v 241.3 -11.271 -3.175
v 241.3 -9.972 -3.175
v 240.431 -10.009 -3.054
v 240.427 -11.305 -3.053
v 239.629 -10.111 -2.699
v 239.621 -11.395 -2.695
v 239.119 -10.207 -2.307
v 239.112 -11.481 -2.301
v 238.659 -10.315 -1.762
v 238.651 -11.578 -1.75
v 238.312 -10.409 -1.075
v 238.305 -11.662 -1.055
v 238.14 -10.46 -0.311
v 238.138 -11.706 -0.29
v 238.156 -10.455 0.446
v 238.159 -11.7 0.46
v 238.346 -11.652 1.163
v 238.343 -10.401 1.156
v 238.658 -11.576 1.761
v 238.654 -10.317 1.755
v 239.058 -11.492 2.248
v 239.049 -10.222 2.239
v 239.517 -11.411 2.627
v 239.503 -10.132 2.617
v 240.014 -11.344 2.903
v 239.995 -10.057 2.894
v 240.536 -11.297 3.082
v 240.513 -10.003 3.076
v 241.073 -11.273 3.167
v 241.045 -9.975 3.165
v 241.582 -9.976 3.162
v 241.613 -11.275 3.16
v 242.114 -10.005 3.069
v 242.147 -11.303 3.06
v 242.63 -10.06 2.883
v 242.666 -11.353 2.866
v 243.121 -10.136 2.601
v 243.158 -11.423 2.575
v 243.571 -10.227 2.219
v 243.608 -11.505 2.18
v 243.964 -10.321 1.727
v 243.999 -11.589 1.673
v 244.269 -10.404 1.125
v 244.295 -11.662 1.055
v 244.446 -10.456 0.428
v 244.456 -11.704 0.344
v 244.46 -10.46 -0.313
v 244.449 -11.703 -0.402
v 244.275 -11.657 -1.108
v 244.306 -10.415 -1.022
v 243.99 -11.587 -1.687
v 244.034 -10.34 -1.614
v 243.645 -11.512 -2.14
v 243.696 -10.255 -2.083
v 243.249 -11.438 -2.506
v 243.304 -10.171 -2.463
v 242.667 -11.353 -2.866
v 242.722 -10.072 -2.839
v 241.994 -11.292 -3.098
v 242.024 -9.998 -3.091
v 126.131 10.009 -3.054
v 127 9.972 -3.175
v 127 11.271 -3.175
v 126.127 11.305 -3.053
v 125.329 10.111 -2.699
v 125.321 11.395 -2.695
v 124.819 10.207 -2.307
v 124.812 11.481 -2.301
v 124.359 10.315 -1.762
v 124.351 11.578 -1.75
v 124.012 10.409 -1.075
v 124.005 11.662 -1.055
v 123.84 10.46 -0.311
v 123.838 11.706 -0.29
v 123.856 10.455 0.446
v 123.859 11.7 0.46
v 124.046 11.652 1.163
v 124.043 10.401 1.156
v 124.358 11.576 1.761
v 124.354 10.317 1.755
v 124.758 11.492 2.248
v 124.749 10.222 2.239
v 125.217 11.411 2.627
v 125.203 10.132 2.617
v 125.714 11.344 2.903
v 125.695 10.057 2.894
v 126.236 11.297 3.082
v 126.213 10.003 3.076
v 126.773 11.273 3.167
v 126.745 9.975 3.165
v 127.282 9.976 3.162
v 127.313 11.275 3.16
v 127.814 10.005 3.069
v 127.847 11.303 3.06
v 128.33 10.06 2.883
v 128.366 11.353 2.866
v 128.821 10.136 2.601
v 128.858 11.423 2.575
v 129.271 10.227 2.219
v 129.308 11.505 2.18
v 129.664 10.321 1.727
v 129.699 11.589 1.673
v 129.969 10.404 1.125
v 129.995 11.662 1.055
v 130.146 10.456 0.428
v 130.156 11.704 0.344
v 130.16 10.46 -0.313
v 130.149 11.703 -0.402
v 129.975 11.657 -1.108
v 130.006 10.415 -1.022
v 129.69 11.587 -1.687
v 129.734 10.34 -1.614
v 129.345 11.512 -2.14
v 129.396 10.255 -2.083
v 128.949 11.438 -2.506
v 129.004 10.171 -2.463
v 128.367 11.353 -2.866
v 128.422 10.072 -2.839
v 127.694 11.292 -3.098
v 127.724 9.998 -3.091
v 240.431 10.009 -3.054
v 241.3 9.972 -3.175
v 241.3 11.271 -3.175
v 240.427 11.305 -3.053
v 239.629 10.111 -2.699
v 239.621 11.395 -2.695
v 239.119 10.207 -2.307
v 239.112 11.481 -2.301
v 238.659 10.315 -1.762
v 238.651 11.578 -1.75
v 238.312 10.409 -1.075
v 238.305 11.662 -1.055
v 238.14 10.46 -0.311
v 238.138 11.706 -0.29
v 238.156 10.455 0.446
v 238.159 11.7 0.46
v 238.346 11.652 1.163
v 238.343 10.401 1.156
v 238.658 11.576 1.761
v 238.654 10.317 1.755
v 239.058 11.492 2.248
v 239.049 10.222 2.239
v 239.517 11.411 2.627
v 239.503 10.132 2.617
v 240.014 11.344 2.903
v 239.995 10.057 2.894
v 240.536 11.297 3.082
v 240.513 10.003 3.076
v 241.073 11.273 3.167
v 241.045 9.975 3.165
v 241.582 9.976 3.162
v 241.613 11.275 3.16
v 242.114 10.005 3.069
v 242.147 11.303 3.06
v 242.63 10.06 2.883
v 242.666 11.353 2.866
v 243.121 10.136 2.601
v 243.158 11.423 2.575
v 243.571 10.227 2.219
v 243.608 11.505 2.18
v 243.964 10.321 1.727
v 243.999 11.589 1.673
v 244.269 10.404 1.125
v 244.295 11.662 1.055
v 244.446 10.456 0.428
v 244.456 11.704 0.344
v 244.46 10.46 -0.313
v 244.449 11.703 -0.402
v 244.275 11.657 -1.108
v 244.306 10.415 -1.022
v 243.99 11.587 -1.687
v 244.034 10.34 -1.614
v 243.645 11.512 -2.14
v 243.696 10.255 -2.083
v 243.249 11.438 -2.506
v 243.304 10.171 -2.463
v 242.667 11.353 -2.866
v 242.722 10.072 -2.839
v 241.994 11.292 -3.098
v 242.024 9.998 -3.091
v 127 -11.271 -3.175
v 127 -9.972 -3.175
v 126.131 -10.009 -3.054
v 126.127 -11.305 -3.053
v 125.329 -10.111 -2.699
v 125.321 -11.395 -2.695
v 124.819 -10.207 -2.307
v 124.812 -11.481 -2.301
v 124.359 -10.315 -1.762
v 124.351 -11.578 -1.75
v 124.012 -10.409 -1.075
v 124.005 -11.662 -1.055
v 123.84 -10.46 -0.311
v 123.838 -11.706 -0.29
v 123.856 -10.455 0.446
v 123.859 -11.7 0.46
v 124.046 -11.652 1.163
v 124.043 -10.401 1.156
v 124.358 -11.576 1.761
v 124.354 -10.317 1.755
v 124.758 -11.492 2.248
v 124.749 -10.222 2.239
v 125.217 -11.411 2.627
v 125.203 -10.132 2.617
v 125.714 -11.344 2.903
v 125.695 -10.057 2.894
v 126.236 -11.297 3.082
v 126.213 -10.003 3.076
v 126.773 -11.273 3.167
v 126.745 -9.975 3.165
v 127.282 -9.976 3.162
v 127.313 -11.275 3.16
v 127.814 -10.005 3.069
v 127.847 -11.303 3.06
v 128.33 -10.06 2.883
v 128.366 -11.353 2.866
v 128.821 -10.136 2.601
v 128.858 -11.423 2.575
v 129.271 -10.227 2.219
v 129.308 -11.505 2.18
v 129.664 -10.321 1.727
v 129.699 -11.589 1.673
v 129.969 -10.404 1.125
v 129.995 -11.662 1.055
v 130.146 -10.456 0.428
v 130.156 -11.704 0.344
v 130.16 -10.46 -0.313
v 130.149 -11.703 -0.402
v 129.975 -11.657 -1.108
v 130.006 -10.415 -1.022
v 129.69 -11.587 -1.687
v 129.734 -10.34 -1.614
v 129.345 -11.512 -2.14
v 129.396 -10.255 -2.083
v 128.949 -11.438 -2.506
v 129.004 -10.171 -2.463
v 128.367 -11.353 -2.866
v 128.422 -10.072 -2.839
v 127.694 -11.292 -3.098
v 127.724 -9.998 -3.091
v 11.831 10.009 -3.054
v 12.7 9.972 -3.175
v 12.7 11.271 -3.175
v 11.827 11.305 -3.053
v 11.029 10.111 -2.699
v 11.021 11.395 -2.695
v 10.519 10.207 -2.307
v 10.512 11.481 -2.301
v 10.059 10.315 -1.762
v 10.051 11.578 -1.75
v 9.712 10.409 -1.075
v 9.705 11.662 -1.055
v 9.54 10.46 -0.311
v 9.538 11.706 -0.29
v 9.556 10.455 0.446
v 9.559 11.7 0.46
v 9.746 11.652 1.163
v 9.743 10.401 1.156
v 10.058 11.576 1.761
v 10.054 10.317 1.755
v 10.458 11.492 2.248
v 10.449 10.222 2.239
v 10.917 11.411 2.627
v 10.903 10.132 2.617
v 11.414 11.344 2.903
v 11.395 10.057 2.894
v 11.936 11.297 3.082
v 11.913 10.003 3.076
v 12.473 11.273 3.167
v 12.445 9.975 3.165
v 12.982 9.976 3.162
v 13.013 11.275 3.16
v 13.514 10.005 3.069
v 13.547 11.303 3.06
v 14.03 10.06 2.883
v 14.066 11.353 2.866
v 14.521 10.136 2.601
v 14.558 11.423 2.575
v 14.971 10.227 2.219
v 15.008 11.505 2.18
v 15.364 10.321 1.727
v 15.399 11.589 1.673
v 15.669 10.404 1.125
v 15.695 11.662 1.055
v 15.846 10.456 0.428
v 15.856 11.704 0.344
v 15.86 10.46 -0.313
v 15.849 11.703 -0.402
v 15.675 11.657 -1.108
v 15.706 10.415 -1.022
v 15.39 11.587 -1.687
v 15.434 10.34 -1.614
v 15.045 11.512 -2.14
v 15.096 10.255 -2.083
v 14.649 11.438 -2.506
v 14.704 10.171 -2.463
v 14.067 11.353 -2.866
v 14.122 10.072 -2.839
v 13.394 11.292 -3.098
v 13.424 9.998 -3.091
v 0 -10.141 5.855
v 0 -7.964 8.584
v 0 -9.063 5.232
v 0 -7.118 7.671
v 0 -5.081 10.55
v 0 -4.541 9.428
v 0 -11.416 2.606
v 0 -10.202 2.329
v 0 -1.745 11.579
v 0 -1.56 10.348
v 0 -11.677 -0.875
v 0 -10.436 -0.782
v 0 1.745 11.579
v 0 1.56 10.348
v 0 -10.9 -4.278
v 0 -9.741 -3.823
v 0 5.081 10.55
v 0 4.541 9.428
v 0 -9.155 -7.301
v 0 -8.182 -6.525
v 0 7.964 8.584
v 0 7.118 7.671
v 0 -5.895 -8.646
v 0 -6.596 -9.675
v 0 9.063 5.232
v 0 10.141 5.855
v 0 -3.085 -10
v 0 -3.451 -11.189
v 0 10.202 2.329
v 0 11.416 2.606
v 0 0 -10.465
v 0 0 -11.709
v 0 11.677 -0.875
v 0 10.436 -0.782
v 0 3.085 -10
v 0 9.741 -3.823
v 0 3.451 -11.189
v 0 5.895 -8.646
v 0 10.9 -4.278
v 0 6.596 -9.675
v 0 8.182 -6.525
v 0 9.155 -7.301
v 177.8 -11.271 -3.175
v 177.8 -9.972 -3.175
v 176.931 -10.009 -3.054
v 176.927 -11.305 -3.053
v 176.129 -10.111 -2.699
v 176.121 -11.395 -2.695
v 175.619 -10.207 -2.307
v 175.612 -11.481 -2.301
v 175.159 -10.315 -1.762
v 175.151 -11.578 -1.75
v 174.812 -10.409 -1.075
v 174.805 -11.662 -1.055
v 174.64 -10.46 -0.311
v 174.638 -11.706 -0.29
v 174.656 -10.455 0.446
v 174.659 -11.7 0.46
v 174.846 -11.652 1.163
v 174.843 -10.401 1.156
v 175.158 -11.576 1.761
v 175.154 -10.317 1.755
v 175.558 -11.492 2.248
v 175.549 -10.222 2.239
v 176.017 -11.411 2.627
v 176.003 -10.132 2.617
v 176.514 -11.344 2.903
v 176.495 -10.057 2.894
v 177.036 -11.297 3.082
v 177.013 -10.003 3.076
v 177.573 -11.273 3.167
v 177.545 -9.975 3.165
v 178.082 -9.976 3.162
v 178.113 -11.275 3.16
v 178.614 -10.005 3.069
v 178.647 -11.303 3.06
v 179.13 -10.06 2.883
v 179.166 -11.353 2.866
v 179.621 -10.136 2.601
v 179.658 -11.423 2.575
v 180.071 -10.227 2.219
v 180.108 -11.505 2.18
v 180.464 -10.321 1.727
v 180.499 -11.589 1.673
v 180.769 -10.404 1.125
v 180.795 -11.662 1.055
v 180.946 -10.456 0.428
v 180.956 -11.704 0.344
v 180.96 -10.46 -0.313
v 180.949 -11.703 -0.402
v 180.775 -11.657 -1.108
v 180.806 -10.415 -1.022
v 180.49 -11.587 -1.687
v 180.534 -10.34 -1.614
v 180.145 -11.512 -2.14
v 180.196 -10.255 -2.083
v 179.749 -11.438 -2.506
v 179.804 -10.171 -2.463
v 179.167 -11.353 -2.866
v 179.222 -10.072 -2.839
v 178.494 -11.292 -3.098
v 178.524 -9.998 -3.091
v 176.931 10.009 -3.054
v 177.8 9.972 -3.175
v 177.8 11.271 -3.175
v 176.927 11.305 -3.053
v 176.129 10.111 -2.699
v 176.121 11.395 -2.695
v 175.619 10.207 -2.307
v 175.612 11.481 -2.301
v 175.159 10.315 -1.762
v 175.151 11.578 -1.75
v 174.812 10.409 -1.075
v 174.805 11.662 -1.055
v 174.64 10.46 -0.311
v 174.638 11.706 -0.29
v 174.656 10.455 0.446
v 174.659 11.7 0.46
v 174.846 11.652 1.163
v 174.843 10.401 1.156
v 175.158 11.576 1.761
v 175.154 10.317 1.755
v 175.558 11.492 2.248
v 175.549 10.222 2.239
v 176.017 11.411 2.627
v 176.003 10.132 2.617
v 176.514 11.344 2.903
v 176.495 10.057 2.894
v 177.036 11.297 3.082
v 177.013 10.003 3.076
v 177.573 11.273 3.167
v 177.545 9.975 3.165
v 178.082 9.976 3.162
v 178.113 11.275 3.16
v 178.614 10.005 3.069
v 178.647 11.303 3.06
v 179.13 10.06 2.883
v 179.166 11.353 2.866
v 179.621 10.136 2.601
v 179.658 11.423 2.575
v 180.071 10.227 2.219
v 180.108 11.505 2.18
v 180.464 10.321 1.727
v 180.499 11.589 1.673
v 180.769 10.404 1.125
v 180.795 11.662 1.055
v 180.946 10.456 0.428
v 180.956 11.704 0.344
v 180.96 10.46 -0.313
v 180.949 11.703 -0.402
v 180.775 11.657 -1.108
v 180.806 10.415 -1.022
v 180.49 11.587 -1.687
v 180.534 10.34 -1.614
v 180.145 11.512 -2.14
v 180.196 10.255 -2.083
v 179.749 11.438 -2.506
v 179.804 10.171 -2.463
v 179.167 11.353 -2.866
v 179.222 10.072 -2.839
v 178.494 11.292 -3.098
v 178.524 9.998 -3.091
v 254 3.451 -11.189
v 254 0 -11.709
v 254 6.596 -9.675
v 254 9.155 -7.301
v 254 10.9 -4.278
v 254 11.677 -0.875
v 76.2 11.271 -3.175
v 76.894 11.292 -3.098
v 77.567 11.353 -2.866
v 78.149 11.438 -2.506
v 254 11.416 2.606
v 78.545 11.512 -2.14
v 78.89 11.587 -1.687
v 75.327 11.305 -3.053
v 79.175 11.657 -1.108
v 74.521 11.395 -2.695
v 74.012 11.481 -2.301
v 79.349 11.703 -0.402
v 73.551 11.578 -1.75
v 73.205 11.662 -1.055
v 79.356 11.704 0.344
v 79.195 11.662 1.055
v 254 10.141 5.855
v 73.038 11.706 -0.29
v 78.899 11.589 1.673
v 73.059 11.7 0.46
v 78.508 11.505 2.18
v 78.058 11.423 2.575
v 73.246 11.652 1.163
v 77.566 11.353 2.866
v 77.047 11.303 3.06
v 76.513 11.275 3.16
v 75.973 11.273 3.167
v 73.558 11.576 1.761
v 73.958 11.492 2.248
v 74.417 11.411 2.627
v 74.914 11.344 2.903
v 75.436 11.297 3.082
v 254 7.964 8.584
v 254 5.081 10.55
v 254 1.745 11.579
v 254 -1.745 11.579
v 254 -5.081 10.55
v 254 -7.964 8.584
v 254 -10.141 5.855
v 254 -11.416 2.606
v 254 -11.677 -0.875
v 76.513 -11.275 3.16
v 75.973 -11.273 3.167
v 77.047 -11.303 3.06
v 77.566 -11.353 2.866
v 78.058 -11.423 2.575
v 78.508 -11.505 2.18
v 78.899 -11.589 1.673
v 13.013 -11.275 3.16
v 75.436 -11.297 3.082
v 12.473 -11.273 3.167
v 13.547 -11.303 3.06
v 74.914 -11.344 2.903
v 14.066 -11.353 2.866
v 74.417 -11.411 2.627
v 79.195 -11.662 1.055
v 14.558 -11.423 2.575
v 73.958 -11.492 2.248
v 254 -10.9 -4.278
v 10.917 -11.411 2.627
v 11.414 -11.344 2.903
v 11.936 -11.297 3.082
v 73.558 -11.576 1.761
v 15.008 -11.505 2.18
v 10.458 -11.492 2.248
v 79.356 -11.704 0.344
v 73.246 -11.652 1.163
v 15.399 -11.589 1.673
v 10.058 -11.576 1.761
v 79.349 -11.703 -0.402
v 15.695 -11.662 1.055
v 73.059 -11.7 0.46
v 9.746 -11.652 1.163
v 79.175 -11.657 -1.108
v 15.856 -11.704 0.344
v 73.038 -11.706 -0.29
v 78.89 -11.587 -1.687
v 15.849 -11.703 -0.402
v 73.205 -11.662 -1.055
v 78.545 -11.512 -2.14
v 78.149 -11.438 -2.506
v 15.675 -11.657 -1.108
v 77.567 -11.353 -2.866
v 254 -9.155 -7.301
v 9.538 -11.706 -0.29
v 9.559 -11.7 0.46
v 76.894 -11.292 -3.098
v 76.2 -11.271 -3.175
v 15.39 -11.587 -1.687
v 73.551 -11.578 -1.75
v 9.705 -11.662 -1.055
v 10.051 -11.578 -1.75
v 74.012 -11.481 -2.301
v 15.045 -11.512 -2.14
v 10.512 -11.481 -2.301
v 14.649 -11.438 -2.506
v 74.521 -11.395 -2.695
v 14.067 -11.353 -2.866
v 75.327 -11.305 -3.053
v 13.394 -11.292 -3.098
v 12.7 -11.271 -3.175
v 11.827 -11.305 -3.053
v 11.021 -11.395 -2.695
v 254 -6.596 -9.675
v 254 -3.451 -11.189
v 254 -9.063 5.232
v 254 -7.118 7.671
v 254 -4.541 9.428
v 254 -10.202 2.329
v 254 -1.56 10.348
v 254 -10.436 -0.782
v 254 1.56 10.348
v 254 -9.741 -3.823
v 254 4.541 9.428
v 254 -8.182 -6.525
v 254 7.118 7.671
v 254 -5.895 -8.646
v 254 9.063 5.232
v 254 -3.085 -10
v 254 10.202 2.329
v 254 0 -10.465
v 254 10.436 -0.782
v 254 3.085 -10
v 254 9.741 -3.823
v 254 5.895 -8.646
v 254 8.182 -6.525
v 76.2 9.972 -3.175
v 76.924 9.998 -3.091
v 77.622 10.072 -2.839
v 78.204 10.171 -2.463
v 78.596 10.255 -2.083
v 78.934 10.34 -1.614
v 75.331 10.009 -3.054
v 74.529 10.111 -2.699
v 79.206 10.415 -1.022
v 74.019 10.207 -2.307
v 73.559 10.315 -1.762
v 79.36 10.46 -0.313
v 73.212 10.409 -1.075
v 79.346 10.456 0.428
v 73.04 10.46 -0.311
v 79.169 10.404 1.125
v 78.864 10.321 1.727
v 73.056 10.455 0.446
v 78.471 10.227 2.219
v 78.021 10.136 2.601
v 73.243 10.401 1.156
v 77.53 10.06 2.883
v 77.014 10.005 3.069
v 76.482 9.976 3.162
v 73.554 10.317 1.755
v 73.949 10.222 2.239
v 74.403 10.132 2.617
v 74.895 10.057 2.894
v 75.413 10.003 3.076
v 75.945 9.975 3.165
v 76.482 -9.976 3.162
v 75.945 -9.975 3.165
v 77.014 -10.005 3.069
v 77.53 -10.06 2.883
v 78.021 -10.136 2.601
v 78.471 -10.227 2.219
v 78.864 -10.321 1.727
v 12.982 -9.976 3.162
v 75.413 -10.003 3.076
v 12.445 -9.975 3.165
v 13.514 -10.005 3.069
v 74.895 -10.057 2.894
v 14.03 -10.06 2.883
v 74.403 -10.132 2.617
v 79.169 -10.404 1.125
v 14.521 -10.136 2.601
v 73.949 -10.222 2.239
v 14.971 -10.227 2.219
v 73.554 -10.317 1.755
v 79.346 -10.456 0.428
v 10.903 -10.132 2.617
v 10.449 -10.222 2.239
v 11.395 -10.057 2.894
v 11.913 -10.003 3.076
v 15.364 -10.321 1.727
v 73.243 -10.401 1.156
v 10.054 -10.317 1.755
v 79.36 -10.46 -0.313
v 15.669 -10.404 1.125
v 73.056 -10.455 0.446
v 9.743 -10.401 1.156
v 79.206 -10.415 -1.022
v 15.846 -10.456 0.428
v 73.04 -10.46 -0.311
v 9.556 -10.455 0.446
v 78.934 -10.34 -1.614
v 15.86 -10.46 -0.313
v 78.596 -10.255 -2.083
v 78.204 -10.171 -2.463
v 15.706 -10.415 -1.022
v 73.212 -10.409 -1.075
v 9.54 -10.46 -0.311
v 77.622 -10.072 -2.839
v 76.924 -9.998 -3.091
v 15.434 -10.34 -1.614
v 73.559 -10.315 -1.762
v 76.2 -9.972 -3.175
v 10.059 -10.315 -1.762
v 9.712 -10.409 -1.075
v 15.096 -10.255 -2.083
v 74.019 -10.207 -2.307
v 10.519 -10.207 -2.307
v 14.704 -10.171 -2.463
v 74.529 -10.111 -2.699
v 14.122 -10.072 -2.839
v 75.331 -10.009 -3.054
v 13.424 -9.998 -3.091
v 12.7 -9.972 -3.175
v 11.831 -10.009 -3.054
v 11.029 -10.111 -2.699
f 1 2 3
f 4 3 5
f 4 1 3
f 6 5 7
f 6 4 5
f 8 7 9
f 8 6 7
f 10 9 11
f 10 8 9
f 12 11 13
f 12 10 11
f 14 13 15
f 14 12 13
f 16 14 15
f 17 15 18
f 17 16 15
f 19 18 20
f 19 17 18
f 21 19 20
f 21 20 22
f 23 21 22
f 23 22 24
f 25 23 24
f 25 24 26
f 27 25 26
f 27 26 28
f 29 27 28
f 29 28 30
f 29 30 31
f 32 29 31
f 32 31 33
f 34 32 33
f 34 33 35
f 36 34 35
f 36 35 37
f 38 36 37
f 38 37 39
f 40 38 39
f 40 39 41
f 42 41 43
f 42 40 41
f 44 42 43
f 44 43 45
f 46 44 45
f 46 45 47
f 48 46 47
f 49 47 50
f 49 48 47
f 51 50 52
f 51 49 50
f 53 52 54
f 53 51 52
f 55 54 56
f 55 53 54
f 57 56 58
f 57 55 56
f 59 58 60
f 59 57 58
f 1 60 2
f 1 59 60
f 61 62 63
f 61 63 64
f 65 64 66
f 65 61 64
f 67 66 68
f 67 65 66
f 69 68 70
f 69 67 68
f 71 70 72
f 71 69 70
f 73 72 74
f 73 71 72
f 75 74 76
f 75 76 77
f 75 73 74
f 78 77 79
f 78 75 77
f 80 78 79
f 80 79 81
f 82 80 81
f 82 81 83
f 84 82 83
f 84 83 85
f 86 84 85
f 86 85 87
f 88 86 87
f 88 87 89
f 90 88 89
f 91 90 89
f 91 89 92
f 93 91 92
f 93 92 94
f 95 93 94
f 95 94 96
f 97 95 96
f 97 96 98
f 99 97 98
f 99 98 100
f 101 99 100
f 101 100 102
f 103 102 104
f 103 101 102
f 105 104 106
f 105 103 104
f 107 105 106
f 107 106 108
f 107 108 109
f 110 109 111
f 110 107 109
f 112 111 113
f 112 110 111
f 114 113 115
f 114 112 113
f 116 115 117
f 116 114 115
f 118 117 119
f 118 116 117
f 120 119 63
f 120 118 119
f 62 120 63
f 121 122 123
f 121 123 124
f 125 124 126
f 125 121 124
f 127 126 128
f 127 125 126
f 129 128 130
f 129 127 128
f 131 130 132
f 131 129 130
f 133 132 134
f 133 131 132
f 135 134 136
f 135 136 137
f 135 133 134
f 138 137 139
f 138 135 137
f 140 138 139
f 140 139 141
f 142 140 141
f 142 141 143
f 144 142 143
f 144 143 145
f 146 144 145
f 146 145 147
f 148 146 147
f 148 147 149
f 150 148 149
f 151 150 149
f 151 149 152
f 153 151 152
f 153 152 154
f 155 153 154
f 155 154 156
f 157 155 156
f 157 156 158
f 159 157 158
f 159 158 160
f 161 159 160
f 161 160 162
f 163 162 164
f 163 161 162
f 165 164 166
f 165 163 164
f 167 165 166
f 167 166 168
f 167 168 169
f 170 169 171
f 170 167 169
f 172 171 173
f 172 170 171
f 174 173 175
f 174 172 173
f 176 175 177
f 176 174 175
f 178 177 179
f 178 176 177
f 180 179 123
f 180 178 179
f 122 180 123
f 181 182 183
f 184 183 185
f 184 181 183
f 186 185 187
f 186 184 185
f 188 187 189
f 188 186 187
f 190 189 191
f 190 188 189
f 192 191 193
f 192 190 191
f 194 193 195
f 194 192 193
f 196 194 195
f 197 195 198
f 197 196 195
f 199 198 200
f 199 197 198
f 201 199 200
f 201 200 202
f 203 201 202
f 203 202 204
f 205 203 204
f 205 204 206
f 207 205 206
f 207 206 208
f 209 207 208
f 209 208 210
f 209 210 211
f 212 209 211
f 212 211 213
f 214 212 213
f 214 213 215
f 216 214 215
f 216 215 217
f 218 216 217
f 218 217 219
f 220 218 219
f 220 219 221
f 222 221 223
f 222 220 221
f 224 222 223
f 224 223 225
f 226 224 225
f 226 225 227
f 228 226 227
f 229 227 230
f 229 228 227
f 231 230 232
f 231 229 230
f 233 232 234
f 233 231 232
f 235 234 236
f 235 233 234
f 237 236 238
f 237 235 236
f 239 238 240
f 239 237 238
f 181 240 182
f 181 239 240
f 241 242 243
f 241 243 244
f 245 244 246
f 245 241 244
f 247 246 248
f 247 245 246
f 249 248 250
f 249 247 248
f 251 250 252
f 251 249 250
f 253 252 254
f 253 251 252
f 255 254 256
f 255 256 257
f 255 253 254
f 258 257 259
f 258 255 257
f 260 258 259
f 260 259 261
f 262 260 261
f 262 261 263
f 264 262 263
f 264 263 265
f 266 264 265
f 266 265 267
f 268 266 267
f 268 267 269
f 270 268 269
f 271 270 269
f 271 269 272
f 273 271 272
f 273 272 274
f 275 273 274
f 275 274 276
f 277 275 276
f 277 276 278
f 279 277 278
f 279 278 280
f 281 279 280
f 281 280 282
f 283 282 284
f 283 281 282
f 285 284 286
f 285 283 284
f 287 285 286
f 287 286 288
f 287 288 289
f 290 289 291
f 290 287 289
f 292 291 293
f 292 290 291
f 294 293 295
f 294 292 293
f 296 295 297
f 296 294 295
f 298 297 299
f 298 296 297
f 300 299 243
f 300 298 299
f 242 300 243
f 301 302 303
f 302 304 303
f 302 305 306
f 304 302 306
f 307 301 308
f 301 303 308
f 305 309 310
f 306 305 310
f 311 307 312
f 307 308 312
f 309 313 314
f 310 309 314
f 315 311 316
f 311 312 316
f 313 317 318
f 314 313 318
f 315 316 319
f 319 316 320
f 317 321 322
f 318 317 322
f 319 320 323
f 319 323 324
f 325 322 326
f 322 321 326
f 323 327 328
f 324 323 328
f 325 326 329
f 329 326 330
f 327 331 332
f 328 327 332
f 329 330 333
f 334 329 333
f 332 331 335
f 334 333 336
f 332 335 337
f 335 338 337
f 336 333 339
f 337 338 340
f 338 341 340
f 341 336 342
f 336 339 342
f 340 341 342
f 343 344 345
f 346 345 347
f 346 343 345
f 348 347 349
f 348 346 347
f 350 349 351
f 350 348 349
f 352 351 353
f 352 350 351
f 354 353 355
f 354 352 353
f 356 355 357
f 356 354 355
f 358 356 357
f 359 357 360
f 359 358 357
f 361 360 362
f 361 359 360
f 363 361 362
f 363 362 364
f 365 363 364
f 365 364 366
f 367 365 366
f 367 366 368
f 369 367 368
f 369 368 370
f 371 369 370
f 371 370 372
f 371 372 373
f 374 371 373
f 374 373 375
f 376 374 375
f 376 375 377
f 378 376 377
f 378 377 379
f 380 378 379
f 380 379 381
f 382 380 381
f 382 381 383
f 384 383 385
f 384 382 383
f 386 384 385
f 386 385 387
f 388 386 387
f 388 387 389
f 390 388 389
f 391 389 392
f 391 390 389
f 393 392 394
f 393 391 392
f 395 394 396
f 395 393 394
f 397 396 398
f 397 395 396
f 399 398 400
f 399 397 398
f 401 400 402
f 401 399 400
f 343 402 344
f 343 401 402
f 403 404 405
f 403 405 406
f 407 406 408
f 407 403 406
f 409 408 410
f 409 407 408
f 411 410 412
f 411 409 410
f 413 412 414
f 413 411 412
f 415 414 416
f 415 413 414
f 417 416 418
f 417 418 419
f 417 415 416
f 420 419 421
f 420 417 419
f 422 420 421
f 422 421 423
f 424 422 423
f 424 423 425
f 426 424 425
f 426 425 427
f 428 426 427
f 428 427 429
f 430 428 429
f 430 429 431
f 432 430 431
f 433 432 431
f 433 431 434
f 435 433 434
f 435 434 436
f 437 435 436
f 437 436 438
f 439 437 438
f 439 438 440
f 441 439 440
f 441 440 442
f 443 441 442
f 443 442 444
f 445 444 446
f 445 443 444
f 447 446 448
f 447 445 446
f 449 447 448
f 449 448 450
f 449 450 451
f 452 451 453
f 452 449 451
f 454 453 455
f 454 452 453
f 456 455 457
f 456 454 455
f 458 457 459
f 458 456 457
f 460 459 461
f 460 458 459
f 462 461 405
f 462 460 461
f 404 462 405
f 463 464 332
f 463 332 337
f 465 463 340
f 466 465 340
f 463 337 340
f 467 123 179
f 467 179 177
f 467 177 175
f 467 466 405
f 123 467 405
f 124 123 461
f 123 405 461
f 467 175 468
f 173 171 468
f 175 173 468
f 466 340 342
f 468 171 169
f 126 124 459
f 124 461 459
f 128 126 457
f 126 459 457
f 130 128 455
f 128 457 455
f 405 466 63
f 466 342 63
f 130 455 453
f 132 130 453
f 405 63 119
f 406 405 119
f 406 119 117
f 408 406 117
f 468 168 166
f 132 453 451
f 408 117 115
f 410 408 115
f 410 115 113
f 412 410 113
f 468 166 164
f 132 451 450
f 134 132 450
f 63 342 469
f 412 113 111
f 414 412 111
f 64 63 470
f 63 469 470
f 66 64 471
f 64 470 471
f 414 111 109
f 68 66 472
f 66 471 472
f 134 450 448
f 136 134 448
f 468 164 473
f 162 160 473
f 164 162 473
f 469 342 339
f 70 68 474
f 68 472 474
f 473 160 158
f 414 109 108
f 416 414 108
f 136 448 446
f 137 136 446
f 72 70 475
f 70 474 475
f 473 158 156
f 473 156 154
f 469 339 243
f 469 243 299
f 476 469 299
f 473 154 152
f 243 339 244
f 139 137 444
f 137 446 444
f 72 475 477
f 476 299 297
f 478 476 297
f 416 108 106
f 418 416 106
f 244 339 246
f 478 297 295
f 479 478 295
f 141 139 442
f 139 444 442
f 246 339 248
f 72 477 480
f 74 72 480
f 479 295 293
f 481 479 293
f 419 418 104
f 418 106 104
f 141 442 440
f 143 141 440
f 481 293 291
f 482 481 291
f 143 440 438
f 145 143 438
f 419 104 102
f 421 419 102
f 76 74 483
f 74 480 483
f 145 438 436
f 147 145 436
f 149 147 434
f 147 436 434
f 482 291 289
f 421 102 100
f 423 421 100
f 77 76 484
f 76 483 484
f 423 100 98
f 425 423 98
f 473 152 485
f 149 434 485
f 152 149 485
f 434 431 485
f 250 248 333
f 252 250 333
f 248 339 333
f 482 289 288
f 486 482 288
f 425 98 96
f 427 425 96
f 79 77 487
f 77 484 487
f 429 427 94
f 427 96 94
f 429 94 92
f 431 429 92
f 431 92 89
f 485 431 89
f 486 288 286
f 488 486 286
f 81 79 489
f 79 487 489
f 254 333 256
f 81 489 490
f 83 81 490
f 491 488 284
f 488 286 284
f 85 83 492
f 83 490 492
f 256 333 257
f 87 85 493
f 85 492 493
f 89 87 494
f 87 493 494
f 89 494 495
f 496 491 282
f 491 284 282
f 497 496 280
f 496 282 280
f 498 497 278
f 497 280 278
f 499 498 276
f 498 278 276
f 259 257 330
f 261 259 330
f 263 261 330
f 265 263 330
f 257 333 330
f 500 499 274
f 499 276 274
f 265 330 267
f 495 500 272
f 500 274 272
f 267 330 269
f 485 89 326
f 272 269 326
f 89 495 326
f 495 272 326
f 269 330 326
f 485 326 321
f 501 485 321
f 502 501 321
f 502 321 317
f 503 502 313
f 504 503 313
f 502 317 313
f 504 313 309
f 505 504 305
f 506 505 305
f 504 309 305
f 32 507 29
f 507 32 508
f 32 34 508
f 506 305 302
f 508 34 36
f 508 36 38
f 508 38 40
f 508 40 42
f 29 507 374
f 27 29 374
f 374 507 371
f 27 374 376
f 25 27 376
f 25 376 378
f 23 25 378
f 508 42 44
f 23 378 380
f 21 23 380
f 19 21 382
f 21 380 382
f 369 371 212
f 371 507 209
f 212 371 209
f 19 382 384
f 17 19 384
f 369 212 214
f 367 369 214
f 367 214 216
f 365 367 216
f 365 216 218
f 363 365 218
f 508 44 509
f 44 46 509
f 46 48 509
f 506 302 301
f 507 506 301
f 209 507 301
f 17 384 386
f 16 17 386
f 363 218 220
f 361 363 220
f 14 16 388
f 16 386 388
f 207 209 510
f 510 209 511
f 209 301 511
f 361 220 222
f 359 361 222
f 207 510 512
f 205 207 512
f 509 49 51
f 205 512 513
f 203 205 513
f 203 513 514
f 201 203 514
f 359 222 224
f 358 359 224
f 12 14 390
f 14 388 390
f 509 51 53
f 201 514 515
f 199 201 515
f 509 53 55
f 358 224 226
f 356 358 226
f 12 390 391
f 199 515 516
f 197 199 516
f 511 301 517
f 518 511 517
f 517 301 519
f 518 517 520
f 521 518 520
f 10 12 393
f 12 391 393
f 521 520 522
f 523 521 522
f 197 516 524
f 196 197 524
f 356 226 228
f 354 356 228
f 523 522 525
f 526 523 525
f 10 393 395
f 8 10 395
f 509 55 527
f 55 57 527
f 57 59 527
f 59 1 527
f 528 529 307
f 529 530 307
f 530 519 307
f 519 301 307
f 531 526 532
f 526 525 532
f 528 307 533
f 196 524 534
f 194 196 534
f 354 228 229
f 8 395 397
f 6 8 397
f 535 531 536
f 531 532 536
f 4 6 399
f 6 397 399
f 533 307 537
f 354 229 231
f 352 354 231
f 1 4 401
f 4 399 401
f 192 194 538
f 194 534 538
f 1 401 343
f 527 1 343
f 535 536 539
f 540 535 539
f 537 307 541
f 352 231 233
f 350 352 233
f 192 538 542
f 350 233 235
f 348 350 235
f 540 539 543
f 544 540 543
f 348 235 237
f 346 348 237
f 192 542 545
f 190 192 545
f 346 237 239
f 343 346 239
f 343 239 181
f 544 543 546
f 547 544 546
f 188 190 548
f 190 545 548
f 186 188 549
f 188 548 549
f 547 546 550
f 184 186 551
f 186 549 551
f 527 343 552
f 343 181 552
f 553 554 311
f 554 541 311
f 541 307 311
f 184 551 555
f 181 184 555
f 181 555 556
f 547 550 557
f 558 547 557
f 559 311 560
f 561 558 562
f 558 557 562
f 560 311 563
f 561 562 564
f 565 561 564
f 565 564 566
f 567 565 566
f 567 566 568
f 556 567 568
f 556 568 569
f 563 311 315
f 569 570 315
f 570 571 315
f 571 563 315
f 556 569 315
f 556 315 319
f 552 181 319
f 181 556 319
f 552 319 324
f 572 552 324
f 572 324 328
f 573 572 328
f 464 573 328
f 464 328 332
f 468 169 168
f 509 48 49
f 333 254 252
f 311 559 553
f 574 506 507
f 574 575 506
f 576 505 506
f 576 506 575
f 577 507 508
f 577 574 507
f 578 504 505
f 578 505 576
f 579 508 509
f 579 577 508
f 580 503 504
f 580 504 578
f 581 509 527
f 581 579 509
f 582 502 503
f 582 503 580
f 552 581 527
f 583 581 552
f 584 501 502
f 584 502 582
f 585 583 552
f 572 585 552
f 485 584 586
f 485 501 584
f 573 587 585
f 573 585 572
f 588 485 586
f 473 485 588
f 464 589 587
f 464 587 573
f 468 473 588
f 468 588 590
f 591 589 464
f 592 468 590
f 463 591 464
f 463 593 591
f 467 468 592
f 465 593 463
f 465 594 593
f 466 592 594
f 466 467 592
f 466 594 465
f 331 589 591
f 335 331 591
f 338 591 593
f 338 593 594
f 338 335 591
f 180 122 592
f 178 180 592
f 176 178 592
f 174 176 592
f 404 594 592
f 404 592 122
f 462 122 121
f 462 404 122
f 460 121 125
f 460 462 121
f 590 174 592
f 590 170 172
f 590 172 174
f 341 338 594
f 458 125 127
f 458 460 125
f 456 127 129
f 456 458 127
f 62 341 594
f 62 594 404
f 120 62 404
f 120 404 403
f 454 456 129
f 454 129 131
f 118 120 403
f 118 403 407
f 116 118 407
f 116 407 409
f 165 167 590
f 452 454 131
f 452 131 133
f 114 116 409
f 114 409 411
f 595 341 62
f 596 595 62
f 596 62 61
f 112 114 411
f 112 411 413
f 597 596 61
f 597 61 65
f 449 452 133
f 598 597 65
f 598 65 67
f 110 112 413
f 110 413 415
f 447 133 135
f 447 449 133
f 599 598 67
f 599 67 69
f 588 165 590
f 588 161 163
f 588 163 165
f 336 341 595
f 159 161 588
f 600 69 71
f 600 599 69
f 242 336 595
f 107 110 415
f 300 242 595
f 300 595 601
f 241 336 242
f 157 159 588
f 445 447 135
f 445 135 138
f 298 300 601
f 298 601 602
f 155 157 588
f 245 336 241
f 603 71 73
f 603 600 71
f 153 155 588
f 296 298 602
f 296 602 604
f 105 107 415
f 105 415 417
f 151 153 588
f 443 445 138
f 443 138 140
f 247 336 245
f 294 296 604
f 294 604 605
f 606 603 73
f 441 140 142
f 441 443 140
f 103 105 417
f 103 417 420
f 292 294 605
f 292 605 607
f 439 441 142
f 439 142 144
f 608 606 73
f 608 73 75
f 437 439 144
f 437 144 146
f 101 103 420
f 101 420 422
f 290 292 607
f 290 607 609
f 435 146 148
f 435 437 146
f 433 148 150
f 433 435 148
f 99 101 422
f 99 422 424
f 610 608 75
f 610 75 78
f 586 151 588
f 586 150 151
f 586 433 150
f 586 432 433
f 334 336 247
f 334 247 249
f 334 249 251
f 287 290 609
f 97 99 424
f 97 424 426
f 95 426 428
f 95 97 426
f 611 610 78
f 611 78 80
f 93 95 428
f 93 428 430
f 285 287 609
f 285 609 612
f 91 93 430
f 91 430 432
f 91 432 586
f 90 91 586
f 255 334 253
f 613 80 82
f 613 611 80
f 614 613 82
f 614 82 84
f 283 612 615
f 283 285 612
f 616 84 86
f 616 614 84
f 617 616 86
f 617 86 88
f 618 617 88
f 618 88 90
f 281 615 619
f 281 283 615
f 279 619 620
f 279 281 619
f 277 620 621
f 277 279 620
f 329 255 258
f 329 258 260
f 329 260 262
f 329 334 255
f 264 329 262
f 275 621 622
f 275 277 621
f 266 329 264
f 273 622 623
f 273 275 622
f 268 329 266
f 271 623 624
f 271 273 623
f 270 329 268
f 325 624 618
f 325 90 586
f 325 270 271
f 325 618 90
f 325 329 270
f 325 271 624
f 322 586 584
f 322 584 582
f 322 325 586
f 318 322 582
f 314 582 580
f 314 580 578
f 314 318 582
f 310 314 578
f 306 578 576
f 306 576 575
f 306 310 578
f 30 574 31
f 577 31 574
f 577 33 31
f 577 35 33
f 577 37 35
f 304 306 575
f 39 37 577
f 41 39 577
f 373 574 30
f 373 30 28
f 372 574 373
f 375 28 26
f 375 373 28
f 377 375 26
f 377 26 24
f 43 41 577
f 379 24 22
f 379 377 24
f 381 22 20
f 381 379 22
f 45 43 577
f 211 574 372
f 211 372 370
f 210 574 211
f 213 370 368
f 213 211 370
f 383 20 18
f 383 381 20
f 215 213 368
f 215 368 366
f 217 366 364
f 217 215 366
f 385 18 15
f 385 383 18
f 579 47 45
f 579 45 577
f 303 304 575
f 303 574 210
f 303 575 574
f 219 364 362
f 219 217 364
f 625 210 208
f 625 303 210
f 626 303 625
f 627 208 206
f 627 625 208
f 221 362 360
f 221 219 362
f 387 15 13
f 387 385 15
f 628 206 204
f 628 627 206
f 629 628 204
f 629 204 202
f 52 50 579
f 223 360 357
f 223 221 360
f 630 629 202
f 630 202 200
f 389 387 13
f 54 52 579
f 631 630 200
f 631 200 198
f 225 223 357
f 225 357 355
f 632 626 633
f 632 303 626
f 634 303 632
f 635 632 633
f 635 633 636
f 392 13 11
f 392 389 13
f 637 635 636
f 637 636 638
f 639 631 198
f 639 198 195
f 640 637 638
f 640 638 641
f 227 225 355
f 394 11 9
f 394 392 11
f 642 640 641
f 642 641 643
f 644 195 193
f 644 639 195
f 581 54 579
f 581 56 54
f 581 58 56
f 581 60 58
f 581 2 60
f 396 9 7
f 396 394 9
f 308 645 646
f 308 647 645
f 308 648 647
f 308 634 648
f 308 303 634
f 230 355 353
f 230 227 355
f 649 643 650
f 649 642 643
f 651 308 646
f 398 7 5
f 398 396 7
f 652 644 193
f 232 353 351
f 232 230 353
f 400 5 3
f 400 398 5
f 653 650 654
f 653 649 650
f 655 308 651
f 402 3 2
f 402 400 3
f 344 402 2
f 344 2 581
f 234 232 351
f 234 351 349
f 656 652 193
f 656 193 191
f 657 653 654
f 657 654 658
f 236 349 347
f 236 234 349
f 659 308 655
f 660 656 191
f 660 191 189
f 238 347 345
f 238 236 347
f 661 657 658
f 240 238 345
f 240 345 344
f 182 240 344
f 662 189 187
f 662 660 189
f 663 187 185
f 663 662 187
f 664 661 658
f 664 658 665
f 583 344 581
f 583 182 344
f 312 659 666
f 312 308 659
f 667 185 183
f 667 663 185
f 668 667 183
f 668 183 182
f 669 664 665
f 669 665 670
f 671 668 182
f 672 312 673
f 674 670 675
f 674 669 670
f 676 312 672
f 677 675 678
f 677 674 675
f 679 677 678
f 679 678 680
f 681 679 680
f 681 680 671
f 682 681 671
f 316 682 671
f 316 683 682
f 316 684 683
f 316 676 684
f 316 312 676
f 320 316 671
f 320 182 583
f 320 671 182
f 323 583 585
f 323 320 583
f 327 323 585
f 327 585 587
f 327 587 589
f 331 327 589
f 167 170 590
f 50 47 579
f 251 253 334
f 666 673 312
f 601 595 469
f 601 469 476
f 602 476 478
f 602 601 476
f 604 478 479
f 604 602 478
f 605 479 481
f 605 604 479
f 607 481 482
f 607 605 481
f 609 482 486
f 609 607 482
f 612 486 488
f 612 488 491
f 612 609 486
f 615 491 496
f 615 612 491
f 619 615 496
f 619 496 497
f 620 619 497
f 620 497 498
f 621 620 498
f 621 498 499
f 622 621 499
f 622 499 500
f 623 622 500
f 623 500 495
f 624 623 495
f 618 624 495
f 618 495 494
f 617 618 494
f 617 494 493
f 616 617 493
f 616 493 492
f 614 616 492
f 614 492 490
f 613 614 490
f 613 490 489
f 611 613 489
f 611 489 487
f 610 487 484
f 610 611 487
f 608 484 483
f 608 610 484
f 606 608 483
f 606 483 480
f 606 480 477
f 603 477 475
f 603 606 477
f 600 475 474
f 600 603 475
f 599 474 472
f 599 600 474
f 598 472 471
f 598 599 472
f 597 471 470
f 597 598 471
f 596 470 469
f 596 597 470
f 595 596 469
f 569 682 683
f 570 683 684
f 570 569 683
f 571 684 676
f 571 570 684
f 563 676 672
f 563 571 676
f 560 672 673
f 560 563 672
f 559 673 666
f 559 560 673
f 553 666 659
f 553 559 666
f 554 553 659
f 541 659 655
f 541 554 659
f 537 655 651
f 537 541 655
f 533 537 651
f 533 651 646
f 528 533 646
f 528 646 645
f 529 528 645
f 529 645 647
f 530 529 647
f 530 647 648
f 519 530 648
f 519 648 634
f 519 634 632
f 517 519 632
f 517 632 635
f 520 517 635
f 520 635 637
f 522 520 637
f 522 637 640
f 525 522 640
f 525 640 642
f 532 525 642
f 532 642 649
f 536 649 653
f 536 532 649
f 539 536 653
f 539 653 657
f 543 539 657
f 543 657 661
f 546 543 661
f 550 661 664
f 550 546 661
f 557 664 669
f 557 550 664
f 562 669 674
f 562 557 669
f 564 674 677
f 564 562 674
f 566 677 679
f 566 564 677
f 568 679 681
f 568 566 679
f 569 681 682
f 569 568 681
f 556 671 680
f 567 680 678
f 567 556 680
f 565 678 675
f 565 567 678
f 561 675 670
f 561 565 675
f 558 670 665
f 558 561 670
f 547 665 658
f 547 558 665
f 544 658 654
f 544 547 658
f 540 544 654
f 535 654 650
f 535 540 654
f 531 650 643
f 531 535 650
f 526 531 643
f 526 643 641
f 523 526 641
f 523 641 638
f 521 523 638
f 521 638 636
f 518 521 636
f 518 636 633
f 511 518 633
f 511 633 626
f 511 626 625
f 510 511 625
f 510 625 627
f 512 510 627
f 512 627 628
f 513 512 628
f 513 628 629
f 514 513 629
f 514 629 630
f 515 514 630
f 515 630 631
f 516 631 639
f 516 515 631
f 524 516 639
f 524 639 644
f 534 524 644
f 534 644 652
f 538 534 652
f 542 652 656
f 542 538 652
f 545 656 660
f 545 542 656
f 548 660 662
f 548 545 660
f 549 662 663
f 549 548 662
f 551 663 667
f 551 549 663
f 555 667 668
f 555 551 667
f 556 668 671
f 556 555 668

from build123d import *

# Parameters (mm, degrees)
SKETCH3_R               = 11.7094
SKETCH3_R_2             = 10.4648
BOSS_EXTRUDE1_DEPTH     = 254
CUT_EXTRUDE1_DEPTH      = 255.539230958
CUT_EXTRUDE1_DEPTH_BACK = 255.539230958
SKETCH4_R               = 3.175


with BuildPart() as part:
    # Sketch3 → Boss-Extrude1 (new body)
    with BuildSketch(Plane(origin=(0, 0, 0), x_dir=(0, 0, -1), z_dir=(1, 0, 0))):
        Circle(SKETCH3_R)
        Circle(SKETCH3_R_2, mode=Mode.SUBTRACT)
    extrude(amount=BOSS_EXTRUDE1_DEPTH)

    # Sketch4 → Cut-Extrude1 (cut, two sides: drawn at the far end of the back side and taken through both)
    with BuildSketch(Plane(origin=(0, 0, 0), x_dir=(1, 0, 0), z_dir=(0, 1, 0)).offset(-CUT_EXTRUDE1_DEPTH_BACK)):
        with Locations(Location((127, 0, 0), (0, 0, 90))):
            Circle(SKETCH4_R)
        with Locations(Location((12.7, 0, 0), (0, 0, 90))):
            Circle(SKETCH4_R)
        with Locations(Location((76.2, 0, 0), (0, 0, 90))):
            Circle(SKETCH4_R)
        with Locations(Location((177.8, 0, 0), (0, 0, 90))):
            Circle(SKETCH4_R)
        with Locations(Location((241.3, 0, 0), (0, 0, 90))):
            Circle(SKETCH4_R)
    extrude(amount=CUT_EXTRUDE1_DEPTH + CUT_EXTRUDE1_DEPTH_BACK, mode=Mode.SUBTRACT)


solid = part.part
